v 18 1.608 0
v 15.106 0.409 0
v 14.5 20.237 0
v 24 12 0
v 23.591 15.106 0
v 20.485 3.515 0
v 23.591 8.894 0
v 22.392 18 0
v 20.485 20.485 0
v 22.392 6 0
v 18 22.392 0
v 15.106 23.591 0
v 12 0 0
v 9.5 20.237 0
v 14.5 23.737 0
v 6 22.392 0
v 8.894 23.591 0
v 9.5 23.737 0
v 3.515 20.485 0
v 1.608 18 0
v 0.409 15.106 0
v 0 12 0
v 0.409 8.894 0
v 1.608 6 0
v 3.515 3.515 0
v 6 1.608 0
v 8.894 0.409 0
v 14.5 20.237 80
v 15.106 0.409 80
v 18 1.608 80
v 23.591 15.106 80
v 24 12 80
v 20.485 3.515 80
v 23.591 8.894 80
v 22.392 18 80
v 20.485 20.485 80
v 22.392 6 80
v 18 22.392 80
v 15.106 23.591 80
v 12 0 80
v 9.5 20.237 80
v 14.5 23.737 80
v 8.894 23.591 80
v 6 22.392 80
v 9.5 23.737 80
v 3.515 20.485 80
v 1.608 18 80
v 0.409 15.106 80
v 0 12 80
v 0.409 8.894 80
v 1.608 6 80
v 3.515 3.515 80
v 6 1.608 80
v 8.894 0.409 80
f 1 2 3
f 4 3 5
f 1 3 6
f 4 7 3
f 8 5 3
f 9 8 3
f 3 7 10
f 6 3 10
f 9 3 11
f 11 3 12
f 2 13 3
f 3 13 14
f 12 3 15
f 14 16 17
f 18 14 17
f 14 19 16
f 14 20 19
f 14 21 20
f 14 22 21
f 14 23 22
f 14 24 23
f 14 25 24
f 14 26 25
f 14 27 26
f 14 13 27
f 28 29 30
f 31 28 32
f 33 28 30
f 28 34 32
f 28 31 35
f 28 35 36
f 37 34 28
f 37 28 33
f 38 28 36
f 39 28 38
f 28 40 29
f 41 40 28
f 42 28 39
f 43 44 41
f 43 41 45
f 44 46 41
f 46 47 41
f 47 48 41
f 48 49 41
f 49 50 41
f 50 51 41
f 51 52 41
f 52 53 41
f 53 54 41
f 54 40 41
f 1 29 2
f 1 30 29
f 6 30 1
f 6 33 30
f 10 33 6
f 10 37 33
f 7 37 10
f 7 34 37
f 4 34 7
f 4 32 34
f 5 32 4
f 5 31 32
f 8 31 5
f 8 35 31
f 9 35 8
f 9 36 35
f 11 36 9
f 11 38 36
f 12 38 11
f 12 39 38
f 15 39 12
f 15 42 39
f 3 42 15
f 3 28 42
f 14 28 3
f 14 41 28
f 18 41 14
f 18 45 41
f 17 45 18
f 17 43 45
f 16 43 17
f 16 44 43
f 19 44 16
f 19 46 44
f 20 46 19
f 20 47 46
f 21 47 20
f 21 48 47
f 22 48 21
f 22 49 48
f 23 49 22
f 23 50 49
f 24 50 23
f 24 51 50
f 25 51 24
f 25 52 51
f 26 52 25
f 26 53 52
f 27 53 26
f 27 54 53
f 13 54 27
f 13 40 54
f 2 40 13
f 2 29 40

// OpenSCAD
$fn = 32;

// ----------------------------------------------------------------------
// Keyway shaft: d24 shaft, key 5 x 3.5 mm
// ----------------------------------------------------------------------

// --- parameters (mm) ---
shaft_r = 12;             // shaft radius
key_w = 5;                // keyway width
key_d = 3.5;              // keyway depth below the surface line
plate_t = 80;             // shaft length, Z (extrusion height)

shaft_d = 2 * shaft_r;  // shaft diameter
circle_step = 15;  // polygon sampling step, degrees

profile = [[8.894, 23.591], [6, 22.392], [3.515, 20.485], [1.608, 18], [0.409, 15.106], [0, 12], [0.409, 8.894], [1.608, 6], [3.515, 3.515], [6, 1.608], [8.894, 0.409], [12, 0], [15.106, 0.409], [18, 1.608], [20.485, 3.515], [22.392, 6], [23.591, 8.894], [24, 12], [23.591, 15.106], [22.392, 18], [20.485, 20.485], [18, 22.392], [15.106, 23.591], [14.5, 23.737], [14.5, 20.237], [9.5, 20.237], [9.5, 23.737]];  // primary outline, 27 points, counter clockwise

// --- the one profile operation ---
linear_extrude(height = plate_t) polygon(points = profile);
